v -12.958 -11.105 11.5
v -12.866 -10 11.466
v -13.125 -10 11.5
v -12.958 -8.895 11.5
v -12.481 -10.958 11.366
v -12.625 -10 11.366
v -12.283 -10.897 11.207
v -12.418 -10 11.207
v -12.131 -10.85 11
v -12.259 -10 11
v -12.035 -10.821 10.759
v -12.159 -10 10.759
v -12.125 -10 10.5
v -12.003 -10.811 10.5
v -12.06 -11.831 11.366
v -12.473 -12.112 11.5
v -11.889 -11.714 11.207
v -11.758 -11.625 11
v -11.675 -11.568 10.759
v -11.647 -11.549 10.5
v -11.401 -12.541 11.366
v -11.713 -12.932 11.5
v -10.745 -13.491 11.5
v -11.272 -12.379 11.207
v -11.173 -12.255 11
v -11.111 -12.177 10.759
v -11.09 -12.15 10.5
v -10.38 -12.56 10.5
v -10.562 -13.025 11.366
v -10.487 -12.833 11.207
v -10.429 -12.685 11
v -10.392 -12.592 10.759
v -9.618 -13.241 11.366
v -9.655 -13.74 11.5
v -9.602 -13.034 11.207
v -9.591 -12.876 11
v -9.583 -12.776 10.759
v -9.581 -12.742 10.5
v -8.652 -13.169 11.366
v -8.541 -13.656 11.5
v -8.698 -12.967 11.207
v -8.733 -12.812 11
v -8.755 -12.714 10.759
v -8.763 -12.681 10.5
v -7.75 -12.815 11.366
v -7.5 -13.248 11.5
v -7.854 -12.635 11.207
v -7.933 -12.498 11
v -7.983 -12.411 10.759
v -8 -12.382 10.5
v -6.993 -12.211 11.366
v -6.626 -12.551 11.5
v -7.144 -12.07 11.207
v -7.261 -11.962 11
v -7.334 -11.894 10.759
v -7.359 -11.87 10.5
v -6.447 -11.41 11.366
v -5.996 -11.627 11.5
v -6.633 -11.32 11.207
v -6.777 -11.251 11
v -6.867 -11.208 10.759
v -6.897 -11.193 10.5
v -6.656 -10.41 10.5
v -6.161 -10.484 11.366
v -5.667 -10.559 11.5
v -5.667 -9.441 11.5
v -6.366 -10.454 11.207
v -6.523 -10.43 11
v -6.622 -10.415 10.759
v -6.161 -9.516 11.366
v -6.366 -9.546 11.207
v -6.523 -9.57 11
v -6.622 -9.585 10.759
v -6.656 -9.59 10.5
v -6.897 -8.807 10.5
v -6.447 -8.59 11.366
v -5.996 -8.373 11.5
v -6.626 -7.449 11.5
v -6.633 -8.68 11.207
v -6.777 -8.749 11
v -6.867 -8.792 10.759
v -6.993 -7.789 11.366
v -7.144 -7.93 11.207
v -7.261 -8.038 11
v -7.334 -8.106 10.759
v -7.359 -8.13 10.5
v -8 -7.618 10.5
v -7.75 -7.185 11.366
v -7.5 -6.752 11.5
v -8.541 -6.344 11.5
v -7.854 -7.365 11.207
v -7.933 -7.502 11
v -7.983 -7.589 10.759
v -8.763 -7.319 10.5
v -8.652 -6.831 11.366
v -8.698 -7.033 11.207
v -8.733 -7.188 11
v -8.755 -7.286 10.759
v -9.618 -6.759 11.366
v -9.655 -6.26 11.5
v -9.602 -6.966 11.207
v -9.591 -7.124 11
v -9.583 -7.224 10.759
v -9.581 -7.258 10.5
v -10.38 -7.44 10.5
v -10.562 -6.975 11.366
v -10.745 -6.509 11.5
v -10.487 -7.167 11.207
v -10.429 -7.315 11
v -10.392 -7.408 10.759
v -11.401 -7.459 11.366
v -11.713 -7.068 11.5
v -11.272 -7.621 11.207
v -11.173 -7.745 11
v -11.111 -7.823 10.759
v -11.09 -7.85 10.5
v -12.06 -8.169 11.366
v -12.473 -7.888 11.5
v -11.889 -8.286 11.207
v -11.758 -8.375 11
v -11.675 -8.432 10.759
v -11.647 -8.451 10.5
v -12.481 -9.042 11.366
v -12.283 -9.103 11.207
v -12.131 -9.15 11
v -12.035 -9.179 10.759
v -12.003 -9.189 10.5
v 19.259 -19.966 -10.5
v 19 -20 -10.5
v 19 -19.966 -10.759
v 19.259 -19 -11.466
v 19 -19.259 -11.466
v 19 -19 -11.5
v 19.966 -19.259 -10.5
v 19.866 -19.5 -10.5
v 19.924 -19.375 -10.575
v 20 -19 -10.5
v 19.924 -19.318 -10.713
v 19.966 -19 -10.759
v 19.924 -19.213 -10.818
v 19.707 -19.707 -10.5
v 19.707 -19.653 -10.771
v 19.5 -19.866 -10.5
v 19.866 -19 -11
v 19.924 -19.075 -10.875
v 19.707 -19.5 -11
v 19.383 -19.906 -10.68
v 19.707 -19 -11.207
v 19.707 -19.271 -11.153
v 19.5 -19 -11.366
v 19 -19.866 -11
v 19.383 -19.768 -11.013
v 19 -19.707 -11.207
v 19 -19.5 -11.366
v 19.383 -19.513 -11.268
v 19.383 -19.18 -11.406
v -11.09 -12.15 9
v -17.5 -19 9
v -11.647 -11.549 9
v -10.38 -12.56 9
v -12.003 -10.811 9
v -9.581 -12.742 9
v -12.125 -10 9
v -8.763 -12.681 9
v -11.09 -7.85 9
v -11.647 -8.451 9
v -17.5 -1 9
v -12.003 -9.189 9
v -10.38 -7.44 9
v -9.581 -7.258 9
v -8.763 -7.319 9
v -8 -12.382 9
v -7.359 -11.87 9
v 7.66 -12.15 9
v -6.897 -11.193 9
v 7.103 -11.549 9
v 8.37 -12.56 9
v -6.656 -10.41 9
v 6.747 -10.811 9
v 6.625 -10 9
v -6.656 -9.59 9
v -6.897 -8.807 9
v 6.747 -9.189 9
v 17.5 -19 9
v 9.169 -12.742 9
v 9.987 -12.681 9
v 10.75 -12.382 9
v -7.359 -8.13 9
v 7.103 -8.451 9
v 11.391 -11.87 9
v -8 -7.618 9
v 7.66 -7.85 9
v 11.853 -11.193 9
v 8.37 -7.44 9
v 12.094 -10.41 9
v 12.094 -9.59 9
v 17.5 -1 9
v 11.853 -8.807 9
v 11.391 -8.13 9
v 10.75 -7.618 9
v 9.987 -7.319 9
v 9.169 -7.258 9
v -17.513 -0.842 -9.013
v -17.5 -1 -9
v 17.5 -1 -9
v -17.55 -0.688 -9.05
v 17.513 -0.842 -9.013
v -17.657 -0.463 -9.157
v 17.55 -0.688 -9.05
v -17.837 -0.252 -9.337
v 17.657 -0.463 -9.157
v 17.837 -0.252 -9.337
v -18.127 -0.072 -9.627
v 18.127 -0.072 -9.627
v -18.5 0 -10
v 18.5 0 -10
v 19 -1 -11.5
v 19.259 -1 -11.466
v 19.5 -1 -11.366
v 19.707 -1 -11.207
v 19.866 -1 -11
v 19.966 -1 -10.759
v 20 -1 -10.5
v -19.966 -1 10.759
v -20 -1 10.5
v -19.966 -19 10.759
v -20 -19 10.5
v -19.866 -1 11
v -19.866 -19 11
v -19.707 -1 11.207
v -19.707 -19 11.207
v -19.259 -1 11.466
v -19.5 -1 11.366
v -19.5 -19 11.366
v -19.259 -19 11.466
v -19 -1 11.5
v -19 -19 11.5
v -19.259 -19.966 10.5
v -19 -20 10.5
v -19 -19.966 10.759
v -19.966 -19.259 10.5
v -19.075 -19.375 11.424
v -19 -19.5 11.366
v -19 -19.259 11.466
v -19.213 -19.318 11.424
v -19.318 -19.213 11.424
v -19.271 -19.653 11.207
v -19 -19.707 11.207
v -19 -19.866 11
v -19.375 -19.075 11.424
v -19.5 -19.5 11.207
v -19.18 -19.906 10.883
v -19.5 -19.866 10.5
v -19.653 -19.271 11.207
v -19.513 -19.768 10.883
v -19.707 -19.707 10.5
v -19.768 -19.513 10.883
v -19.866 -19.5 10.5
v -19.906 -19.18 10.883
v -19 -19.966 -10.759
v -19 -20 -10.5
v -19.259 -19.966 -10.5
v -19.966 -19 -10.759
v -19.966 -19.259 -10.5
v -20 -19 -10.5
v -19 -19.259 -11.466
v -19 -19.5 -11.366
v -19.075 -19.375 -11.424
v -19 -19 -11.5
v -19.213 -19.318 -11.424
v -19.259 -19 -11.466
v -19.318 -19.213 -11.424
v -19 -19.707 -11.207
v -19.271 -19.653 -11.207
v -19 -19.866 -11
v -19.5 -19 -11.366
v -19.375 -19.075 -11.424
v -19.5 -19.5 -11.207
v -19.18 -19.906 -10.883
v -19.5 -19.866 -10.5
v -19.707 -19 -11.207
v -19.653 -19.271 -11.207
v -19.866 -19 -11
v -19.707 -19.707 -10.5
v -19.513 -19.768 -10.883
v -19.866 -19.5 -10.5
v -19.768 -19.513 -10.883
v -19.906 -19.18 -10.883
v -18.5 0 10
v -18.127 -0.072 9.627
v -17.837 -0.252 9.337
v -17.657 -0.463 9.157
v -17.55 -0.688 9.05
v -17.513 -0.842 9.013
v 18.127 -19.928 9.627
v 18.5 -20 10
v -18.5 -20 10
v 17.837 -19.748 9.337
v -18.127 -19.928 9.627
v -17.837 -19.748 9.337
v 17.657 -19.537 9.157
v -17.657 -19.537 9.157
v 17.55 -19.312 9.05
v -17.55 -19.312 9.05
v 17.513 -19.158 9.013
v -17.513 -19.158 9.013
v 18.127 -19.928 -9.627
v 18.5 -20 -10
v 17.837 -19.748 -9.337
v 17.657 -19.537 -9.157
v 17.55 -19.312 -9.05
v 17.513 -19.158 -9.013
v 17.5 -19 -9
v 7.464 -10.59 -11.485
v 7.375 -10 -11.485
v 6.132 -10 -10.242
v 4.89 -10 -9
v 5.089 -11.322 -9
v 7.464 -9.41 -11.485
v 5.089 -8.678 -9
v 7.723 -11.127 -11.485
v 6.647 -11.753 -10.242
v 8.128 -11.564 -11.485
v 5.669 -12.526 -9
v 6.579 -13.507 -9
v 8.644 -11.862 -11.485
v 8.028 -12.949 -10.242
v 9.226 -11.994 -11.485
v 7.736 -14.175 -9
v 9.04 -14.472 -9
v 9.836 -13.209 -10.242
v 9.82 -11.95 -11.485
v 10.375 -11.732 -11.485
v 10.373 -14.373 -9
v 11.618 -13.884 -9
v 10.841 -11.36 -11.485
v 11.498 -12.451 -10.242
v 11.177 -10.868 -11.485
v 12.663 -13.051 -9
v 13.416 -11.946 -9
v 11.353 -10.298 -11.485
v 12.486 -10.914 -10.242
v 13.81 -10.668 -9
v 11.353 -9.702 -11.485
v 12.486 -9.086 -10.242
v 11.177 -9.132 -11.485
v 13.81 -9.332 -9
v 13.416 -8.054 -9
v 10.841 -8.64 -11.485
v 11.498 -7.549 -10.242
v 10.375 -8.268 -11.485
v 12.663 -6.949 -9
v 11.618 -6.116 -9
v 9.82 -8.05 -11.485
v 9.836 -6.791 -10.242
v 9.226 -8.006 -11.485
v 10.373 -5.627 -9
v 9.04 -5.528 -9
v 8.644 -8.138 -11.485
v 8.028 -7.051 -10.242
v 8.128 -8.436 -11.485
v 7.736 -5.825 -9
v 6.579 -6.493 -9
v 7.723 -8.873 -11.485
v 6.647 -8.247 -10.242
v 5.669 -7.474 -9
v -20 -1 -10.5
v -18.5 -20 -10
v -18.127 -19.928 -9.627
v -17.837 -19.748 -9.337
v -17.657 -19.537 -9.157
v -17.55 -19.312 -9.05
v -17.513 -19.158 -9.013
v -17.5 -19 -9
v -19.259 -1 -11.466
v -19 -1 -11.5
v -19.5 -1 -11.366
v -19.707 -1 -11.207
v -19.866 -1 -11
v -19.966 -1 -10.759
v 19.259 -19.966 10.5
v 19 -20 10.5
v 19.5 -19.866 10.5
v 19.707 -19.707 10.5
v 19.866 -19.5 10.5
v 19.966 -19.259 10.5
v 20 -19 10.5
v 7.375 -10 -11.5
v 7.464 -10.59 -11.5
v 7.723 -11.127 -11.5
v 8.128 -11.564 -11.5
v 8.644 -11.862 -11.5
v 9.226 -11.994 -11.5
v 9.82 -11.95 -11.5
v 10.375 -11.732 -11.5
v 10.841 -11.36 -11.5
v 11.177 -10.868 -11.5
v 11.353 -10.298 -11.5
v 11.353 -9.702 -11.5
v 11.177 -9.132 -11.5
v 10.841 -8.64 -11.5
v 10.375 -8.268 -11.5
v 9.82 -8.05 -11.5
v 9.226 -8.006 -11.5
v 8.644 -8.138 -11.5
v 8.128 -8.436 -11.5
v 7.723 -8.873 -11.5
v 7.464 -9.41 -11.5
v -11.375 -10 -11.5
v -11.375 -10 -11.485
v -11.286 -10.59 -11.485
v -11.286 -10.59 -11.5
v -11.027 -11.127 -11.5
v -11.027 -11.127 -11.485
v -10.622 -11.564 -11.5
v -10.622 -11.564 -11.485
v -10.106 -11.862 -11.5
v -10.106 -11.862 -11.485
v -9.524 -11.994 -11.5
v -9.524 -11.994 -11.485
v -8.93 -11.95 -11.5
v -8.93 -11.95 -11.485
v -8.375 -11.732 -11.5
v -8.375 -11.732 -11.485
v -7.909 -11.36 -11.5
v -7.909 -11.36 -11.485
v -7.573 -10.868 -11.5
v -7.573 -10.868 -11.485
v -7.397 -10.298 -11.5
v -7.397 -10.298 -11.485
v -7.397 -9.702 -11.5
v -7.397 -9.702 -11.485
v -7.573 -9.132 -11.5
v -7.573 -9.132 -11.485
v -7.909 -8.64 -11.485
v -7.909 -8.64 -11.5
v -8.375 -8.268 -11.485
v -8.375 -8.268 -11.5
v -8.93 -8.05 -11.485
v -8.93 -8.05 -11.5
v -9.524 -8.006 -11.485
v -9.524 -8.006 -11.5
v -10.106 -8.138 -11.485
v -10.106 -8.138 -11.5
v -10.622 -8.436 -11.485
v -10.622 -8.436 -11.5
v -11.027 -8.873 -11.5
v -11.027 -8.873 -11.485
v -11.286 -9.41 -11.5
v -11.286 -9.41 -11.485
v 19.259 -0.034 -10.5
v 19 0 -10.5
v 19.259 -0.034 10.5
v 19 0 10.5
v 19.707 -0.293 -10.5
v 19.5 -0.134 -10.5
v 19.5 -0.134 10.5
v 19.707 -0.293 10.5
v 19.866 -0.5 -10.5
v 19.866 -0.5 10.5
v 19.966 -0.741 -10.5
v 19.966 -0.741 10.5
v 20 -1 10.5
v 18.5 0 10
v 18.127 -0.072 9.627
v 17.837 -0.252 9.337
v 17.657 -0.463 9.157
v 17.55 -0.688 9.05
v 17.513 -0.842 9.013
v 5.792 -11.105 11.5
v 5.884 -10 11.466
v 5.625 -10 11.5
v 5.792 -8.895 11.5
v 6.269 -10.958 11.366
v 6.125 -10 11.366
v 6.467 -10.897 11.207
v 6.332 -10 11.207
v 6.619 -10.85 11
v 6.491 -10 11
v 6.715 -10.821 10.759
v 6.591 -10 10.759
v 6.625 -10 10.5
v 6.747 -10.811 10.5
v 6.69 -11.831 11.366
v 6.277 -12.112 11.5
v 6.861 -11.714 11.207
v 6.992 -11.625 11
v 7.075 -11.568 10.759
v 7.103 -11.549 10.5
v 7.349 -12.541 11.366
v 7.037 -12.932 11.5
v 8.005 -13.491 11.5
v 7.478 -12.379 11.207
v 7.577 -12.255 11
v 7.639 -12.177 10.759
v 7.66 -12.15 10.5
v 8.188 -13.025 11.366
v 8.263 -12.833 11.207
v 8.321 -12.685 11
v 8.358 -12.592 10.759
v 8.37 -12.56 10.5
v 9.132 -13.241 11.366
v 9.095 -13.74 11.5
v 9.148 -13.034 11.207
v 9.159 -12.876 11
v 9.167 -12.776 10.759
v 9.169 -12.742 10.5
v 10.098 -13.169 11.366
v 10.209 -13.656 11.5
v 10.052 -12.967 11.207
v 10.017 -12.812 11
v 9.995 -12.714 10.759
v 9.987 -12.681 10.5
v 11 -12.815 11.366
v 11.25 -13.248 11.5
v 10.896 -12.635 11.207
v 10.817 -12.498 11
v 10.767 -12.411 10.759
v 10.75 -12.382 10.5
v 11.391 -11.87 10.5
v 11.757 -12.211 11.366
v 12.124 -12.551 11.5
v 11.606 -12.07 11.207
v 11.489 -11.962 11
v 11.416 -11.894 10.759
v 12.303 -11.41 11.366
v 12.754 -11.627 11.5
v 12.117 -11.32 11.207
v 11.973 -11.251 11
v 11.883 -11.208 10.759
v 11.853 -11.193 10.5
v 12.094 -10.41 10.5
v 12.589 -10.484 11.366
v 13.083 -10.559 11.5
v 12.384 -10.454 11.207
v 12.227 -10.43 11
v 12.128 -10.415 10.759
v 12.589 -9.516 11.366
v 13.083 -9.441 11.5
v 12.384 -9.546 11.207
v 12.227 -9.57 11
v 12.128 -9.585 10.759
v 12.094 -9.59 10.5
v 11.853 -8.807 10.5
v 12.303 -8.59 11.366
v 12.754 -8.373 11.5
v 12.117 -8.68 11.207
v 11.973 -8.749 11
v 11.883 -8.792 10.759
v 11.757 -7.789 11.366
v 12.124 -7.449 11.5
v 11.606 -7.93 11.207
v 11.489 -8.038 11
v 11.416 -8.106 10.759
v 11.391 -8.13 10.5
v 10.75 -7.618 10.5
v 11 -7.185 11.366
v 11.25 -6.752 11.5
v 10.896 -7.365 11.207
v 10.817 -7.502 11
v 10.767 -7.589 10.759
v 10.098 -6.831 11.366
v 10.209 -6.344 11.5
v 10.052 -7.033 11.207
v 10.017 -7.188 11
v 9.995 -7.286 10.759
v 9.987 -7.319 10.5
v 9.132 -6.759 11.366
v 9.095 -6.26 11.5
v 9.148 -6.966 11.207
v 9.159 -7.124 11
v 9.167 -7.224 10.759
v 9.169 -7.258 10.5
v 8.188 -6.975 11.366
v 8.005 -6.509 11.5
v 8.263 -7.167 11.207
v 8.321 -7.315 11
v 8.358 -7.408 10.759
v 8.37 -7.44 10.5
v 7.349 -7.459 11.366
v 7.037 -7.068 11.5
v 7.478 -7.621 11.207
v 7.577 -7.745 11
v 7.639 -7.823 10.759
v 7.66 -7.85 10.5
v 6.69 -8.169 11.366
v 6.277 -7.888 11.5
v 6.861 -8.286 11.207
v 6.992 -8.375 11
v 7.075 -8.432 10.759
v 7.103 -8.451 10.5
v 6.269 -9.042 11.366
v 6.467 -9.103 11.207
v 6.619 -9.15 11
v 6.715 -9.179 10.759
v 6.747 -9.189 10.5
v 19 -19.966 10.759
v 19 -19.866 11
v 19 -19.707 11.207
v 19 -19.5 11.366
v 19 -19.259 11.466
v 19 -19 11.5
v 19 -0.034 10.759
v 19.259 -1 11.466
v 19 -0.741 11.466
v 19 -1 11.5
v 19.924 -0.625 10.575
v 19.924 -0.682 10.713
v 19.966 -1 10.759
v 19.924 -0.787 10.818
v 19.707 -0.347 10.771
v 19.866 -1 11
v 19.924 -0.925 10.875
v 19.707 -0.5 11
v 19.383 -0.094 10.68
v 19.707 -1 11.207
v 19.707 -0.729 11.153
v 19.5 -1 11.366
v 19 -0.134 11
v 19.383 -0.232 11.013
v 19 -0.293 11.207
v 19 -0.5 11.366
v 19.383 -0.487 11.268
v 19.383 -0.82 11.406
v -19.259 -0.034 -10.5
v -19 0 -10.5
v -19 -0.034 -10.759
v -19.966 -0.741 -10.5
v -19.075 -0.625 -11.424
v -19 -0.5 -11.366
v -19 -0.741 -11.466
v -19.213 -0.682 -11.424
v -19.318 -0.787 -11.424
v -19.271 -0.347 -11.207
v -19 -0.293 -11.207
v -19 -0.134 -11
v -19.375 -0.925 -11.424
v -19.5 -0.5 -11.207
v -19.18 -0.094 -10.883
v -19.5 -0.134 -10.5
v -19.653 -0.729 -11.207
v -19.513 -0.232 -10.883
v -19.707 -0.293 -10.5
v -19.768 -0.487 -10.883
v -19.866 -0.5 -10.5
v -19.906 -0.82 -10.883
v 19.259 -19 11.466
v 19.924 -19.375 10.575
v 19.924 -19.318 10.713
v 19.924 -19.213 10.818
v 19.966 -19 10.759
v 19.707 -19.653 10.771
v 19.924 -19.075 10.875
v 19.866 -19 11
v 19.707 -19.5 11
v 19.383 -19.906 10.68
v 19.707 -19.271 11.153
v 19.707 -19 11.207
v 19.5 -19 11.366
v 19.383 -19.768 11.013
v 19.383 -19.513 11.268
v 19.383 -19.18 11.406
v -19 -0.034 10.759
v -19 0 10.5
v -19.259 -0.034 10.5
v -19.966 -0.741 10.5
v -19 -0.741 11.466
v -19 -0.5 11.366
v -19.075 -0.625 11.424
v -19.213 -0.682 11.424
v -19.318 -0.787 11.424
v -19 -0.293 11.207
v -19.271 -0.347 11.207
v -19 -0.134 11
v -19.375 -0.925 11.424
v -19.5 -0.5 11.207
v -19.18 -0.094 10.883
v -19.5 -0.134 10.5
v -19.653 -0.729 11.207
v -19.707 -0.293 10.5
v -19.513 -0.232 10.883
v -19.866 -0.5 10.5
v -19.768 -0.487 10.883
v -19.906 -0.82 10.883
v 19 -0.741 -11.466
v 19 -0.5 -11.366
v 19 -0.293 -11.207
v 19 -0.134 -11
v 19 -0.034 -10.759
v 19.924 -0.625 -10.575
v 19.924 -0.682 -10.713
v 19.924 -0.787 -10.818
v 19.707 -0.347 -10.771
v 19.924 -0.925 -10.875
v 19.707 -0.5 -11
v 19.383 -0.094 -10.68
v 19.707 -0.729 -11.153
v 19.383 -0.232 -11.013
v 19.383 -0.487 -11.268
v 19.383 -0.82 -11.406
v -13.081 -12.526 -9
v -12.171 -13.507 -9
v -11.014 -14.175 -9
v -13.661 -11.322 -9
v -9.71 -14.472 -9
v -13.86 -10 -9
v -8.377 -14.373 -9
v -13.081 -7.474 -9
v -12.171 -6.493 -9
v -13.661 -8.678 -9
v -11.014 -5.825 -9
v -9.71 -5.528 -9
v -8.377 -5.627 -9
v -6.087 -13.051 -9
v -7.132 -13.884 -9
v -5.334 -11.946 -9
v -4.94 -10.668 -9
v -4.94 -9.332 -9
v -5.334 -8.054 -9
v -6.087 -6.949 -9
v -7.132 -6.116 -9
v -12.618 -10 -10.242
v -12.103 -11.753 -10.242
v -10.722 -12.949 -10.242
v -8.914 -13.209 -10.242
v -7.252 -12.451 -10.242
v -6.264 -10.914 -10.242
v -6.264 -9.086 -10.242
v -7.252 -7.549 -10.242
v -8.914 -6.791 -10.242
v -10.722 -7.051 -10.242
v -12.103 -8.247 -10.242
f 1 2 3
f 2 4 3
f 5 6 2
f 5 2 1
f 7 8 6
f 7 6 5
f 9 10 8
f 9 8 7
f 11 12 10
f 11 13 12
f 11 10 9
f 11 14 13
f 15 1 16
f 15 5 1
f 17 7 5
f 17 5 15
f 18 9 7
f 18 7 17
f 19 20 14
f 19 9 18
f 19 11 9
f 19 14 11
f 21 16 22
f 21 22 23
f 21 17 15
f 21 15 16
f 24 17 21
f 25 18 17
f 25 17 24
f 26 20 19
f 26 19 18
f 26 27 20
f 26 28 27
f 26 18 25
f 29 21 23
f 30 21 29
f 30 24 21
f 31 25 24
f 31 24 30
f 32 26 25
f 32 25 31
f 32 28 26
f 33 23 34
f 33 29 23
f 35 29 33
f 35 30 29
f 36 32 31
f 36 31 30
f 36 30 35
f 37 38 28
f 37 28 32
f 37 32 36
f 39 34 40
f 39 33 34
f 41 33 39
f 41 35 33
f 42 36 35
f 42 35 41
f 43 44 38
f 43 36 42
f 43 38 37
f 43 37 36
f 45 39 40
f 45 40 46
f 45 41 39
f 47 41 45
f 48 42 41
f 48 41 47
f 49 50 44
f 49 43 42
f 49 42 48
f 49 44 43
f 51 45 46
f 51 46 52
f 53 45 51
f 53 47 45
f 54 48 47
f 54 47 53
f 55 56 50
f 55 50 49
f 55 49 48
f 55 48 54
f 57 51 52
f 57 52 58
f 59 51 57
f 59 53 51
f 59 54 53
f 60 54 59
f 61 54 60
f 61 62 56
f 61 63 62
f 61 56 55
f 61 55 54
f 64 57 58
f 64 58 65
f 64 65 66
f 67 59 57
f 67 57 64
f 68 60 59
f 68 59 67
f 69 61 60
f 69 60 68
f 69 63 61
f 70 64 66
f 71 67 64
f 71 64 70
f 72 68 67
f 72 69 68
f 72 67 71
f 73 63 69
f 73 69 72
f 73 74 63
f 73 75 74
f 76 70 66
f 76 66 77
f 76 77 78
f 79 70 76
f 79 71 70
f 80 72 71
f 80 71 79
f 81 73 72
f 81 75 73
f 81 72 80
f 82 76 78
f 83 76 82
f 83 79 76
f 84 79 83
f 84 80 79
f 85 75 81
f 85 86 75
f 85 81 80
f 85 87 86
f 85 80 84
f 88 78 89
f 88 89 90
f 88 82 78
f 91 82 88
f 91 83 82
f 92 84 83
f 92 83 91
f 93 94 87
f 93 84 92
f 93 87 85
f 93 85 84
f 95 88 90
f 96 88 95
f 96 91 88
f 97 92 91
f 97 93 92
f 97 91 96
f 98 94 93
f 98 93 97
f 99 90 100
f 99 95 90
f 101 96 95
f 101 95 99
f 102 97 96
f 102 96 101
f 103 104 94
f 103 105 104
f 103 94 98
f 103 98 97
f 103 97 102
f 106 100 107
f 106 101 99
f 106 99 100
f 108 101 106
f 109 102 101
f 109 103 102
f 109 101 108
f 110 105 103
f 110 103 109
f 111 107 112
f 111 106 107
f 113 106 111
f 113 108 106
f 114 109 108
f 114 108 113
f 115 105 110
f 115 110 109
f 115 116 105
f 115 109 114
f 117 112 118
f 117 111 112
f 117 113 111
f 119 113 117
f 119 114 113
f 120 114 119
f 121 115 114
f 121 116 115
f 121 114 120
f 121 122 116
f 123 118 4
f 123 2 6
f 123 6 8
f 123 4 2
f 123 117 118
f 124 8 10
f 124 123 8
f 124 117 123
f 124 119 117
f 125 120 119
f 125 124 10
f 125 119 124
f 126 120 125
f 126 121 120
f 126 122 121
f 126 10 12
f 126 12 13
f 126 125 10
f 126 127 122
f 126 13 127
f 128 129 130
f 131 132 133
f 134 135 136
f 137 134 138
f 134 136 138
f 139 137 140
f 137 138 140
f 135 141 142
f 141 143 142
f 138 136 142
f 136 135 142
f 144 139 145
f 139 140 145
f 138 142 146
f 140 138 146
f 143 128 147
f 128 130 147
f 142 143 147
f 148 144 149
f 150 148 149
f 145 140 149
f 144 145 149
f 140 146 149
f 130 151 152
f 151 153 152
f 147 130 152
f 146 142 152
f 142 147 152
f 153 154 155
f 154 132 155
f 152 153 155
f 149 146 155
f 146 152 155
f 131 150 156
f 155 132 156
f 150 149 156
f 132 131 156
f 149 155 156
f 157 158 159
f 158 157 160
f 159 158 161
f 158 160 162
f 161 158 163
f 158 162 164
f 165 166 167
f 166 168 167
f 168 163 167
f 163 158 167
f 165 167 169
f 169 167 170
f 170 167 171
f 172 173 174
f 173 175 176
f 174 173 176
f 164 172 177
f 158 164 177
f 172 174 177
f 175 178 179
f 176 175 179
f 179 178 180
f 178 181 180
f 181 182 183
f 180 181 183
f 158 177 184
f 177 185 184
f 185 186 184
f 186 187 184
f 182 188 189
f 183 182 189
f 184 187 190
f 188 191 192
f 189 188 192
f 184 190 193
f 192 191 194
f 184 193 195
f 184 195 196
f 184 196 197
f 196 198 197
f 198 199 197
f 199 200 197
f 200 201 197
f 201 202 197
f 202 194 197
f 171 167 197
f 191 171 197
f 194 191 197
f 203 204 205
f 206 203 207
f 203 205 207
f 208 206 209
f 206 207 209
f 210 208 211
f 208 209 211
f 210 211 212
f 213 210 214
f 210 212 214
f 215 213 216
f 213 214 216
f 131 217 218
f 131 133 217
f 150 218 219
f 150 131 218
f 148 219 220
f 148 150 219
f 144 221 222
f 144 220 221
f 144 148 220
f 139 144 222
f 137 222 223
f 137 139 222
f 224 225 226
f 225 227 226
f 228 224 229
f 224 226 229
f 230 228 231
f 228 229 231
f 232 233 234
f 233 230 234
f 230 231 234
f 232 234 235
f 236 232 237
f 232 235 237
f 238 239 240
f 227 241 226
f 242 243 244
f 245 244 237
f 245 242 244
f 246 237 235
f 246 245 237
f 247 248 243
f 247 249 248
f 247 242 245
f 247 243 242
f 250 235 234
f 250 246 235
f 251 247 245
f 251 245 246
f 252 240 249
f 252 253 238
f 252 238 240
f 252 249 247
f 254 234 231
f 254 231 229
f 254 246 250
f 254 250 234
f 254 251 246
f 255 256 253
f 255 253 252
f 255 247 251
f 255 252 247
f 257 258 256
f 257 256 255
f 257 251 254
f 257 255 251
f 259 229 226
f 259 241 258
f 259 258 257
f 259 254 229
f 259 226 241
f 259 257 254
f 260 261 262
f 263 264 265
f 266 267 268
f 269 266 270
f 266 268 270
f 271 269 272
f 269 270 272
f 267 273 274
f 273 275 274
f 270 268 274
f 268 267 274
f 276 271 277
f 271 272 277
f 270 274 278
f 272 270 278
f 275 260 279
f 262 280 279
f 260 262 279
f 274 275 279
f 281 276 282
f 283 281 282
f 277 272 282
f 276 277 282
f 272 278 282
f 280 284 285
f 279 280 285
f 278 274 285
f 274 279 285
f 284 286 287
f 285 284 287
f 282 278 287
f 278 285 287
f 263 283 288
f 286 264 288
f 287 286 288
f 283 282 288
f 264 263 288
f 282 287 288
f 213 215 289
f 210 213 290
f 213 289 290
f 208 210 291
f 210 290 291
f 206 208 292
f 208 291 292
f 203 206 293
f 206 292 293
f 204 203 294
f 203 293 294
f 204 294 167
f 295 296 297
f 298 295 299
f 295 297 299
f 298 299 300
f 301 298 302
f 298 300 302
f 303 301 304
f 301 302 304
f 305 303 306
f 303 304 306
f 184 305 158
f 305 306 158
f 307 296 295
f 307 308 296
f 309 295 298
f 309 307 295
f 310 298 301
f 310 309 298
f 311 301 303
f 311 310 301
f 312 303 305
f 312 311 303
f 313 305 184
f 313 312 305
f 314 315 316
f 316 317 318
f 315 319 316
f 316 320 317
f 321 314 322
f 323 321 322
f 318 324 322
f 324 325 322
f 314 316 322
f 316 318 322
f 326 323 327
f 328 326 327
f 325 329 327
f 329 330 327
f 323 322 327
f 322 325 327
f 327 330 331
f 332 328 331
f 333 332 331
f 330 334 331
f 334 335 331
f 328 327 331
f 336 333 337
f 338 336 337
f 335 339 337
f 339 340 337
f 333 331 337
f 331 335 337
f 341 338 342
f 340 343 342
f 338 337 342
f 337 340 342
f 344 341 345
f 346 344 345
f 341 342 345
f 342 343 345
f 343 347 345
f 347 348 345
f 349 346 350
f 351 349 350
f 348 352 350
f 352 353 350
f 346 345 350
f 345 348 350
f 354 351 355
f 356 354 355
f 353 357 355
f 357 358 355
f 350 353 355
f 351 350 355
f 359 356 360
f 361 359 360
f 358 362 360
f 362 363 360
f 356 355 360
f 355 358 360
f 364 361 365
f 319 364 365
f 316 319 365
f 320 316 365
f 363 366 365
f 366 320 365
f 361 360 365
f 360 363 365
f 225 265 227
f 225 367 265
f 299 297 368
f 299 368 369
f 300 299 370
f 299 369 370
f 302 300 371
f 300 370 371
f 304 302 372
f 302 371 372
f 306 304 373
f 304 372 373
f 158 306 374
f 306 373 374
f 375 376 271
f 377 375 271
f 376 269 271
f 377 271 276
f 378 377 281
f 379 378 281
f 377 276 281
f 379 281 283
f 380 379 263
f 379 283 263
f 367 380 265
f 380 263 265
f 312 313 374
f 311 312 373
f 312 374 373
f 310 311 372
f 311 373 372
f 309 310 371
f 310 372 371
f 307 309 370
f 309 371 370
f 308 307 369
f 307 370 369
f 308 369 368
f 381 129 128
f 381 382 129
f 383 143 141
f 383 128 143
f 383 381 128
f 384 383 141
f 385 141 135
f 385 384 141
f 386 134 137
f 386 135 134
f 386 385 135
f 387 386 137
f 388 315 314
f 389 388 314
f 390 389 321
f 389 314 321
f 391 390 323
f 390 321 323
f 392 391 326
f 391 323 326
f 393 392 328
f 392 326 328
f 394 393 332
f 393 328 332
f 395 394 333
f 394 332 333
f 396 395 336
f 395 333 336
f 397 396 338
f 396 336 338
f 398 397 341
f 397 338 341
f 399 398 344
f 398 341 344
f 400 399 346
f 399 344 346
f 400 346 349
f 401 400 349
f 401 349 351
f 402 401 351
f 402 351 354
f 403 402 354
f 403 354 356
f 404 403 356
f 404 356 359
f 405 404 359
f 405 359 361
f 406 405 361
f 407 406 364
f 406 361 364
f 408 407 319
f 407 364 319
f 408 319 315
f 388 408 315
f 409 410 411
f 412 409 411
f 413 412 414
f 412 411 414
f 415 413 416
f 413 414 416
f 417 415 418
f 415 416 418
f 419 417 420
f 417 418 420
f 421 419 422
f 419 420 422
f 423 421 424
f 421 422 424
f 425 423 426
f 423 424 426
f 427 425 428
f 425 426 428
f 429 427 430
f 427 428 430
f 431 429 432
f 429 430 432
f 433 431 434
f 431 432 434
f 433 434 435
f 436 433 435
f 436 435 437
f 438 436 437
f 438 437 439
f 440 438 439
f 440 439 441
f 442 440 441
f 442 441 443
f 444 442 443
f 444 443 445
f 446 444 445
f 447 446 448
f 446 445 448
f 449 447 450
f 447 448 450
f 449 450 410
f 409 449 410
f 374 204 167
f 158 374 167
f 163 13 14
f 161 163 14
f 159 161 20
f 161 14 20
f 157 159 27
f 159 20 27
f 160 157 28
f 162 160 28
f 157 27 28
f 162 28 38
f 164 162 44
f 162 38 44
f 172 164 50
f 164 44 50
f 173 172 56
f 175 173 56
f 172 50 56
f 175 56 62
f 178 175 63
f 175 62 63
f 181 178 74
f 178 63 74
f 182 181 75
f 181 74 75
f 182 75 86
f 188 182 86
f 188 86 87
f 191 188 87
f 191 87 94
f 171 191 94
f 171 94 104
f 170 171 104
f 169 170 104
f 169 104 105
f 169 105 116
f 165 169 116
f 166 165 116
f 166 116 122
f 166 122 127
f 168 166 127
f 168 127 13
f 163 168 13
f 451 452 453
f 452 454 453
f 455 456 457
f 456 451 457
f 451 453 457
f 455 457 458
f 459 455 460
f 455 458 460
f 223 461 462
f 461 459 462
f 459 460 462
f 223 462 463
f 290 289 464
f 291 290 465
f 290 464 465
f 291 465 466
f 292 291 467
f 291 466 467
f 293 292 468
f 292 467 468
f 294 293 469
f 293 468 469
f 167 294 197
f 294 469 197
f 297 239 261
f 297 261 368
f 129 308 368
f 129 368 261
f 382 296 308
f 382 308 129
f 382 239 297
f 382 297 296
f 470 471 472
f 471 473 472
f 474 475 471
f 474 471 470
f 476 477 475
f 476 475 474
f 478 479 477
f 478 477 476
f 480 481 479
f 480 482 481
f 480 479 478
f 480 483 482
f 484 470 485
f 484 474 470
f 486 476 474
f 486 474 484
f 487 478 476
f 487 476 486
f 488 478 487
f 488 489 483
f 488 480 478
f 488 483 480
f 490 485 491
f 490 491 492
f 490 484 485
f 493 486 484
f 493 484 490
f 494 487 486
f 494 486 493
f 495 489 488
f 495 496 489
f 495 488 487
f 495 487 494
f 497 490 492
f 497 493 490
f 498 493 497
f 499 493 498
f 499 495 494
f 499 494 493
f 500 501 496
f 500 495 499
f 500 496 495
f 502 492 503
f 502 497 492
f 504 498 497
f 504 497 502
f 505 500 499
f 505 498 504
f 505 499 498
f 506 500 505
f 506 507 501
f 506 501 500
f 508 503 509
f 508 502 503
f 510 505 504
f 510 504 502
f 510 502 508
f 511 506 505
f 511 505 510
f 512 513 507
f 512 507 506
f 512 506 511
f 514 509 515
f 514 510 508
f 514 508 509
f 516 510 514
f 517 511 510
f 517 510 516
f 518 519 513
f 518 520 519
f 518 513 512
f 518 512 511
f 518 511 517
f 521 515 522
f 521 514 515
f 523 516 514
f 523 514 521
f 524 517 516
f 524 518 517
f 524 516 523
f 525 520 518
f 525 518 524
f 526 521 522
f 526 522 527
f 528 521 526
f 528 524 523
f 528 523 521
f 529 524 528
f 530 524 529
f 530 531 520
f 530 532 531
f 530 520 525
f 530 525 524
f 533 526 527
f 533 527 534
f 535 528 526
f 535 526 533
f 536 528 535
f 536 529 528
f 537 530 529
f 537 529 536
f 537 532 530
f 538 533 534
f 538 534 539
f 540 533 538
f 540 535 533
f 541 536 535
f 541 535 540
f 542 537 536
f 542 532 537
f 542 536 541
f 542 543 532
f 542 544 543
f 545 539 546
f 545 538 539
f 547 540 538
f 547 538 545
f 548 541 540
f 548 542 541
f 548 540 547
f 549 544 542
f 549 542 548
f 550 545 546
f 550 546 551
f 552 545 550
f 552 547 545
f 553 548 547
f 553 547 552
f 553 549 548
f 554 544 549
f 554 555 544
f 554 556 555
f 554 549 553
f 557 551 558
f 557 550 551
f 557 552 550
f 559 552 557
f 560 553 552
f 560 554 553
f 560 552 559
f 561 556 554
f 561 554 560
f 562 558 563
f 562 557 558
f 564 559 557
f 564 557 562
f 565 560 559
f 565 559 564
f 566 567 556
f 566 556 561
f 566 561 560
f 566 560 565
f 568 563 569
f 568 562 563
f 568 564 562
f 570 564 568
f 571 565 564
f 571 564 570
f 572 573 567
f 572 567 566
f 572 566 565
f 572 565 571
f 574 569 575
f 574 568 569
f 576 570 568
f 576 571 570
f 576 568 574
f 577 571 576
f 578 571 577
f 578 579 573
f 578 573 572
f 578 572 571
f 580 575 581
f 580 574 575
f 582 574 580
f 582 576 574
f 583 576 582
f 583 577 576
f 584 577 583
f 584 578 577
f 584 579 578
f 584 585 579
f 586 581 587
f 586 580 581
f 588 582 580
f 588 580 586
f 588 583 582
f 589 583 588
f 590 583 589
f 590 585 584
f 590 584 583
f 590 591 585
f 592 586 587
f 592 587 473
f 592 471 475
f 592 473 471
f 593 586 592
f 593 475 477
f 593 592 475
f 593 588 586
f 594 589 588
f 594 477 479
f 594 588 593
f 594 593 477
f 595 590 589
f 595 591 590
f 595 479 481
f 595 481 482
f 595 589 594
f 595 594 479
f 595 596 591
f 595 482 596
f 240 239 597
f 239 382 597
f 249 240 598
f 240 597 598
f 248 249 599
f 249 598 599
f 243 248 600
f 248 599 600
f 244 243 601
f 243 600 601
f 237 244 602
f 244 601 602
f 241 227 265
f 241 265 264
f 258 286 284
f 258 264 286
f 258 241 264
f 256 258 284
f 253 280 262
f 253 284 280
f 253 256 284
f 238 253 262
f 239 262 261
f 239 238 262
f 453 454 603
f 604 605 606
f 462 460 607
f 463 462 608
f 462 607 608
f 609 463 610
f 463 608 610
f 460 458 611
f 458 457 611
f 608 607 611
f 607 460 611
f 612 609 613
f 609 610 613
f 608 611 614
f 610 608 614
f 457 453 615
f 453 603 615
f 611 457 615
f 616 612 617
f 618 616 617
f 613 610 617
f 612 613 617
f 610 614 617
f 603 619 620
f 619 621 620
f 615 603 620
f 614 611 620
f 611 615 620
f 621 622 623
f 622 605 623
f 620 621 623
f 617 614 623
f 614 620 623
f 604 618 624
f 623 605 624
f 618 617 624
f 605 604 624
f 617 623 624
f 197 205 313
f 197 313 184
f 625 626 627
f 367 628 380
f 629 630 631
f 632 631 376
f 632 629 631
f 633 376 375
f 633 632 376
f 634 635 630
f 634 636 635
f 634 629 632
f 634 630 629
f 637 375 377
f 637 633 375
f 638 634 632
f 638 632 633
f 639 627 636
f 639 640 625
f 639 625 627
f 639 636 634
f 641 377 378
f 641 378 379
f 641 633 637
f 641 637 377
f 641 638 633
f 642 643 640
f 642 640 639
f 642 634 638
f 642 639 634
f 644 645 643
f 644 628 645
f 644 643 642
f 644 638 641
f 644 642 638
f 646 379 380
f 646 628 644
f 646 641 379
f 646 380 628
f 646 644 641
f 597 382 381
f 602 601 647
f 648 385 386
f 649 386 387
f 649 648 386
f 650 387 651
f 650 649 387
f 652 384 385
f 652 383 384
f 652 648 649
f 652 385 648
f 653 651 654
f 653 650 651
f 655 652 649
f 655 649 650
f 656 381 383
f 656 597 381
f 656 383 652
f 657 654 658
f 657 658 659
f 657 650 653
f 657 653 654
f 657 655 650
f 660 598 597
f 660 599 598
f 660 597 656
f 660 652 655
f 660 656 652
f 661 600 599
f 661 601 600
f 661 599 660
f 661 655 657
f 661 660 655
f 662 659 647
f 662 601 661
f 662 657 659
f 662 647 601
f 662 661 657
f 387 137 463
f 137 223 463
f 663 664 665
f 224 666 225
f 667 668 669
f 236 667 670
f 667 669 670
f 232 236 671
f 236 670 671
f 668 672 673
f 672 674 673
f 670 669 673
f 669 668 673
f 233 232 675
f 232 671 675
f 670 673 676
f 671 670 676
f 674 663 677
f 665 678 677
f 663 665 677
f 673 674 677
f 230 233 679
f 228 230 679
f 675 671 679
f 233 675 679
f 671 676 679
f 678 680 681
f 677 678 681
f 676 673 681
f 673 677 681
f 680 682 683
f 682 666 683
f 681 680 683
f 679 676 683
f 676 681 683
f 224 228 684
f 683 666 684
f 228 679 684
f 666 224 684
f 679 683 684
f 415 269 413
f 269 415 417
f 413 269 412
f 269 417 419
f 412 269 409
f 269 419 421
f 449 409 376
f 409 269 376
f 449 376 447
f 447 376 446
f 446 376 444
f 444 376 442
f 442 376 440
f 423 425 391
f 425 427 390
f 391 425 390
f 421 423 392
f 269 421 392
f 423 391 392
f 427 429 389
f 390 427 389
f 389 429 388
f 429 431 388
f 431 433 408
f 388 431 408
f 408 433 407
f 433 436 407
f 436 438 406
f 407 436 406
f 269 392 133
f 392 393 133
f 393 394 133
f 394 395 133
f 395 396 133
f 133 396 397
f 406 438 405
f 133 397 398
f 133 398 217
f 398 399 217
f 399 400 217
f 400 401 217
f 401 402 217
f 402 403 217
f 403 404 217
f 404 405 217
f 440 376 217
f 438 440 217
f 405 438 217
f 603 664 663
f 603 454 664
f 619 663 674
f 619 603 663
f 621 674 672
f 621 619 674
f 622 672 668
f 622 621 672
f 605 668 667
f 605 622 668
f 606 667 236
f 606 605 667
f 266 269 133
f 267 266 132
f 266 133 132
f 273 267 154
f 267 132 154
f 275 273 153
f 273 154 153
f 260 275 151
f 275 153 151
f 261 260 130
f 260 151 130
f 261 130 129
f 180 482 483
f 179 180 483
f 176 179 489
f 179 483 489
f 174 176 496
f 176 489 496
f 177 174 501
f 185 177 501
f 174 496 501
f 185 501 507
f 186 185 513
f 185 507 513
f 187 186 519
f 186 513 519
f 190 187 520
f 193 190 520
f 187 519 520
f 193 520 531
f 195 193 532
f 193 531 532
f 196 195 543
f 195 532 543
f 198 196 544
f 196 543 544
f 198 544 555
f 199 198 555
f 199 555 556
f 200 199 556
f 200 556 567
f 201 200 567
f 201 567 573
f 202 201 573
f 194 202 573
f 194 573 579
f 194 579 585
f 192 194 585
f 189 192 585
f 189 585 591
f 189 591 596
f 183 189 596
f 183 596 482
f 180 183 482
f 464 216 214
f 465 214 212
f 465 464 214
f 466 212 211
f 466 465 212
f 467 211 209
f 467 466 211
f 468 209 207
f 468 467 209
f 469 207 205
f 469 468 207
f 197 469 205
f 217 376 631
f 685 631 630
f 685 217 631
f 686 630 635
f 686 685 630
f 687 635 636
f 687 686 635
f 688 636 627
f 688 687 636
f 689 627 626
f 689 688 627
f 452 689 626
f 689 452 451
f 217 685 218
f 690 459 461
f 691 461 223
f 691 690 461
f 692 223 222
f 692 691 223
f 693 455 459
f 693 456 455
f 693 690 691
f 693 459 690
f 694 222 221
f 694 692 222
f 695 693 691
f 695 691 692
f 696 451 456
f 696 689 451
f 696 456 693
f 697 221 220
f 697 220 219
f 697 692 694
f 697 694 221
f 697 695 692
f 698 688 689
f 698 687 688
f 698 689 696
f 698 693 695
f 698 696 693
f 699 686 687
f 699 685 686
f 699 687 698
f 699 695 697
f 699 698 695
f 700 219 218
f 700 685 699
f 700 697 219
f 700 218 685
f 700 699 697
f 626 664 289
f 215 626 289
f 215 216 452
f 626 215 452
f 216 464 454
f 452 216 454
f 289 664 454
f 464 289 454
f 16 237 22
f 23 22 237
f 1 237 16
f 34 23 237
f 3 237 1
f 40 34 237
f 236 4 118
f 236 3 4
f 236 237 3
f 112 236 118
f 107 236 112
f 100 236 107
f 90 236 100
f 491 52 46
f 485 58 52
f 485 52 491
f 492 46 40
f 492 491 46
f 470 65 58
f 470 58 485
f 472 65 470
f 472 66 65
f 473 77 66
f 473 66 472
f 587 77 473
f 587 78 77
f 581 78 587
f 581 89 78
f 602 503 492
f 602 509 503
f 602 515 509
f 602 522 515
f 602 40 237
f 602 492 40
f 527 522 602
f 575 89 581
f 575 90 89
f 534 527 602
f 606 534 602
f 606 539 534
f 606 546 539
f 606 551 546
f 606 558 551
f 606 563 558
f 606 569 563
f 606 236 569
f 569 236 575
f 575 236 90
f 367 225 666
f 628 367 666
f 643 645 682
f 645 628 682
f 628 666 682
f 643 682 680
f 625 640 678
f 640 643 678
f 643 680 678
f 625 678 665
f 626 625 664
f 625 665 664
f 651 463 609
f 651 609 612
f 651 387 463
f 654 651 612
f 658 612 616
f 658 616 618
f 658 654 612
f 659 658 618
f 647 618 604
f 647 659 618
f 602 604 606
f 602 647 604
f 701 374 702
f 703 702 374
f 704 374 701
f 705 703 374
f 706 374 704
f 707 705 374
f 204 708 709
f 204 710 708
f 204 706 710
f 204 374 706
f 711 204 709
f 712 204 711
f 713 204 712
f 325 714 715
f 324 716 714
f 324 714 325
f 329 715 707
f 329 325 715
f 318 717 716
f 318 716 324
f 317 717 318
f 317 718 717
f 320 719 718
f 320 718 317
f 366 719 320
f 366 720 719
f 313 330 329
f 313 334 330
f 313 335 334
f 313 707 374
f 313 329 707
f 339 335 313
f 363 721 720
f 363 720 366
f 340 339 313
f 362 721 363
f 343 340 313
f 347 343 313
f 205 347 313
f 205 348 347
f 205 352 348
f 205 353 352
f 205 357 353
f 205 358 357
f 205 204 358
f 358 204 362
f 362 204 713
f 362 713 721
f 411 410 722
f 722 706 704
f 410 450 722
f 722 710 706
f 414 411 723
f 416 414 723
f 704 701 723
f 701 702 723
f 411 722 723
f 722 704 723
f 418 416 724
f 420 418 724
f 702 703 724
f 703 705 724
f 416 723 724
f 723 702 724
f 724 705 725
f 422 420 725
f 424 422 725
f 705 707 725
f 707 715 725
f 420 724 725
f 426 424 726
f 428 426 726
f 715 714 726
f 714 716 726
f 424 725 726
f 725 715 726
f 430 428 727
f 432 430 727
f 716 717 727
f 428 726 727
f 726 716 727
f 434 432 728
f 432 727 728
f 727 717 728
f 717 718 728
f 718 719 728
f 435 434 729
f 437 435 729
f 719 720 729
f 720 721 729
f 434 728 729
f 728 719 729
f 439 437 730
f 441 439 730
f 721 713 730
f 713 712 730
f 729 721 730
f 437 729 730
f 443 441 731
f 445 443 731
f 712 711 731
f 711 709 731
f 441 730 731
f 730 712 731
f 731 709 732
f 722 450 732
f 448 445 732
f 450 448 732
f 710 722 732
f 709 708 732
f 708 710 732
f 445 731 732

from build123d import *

# Parameters (mm, degrees)
SKETCH_W          = 40
SKETCH_H          = 23
PAD_DEPTH         = 20
SKETCH001_W       = 35
SKETCH001_H       = 18
POCKET_DEPTH      = 0.001
POCKET_DEPTH_BACK = 20.001
SKETCH002_R       = 2.75
POCKET001_DEPTH   = 3.5
SKETCH003_R       = 2
POCKET002_DEPTH   = 2.5
CHAMFER_SIZE      = 2.485
FILLET_R          = 1
FILLET001_R       = 1


with BuildPart() as part:
    # Sketch → Pad (new body)
    with BuildSketch(Plane.XZ):
        Rectangle(SKETCH_W, SKETCH_H)
    extrude(amount=PAD_DEPTH)

    # Sketch001 → Pocket (cut, two sides)
    with BuildSketch(Plane.XZ) as pocket_sk:
        Rectangle(SKETCH001_W, SKETCH001_H)
    extrude(amount=-POCKET_DEPTH, mode=Mode.SUBTRACT)
    extrude(pocket_sk.sketch, amount=POCKET_DEPTH_BACK, mode=Mode.SUBTRACT)

    # Sketch002 (on DatumPlane) → Pocket001 (cut)
    with BuildSketch(Plane(origin=(0, 0, 11.5), x_dir=(-1, 0, 0), z_dir=(0, 0, 1))):
        with Locations((-9.375, 10)):
            Circle(SKETCH002_R)
        with Locations((9.375, 10)):
            Circle(SKETCH002_R)
    extrude(amount=-POCKET001_DEPTH, mode=Mode.SUBTRACT)

    # Sketch003 (on DatumPlane) → Pocket002 (cut)
    with BuildSketch(Plane(origin=(0, 0, -9), x_dir=(-1, 0, 0), z_dir=(0, 0, 1))):
        with Locations((-9.375, 10)):
            Circle(SKETCH003_R)
        with Locations((9.375, 10)):
            Circle(SKETCH003_R)
    extrude(amount=-POCKET002_DEPTH, mode=Mode.SUBTRACT)

    # Chamfer
    chamfer_edges = [part.edges().sort_by_distance(p)[0] for p in [
        (-7.375, -10, -9),
        (11.375, -10, -9),
    ]]
    chamfer(chamfer_edges, length=CHAMFER_SIZE)

    # Fillet
    fillet_edges = [part.edges().sort_by_distance(p)[0] for p in [
        (-20, -20, 0),
        (0, -20, 11.5),
        (0, -20, -11.5),
        (20, -20, 0),
        (-17.5, -20, 0),
        (0, -20, 9),
        (17.5, -20, 0),
        (0, -20, -9),
        (-20, 0, 0),
        (0, 0, 11.5),
        (0, 0, -11.5),
        (20, 0, 0),
        (-17.5, 0, 0),
        (0, 0, 9),
        (17.5, 0, 0),
        (0, 0, -9),
        (-20, -10, 11.5),
        (20, -10, 11.5),
        (-20, -10, -11.5),
        (20, -10, -11.5),
    ]]
    fillet(fillet_edges, radius=FILLET_R)

    # Fillet001
    fillet001_edges = [part.edges().sort_by_distance(p)[0] for p in [
        (-6.625, -10, 11.5),
        (12.125, -10, 11.5),
    ]]
    fillet(fillet001_edges, radius=FILLET001_R)


solid = part.part
